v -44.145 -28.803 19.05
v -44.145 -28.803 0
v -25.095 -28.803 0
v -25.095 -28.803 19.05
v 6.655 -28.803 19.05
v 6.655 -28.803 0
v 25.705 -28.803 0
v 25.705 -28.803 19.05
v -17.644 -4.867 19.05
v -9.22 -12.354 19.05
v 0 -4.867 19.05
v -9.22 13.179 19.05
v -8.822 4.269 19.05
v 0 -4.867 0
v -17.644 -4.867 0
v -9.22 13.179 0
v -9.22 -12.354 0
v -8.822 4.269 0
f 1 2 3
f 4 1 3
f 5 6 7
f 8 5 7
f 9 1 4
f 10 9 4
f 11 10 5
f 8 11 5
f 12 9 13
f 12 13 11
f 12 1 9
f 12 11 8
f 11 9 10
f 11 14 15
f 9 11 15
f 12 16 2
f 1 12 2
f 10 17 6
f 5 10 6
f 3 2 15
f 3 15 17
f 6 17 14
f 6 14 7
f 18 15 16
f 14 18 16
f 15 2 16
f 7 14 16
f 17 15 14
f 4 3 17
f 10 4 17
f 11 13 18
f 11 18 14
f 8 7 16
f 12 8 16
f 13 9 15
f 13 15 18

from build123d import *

# Parameters (mm, degrees)
F1_DEPTH = 19.05


with BuildPart() as f1:
    # F0 (on Top) → F1 (new body)
    with BuildSketch(Plane.XY):
        Polygon((-9.220245, 13.178808), (-44.145245, -28.803289), (-25.095245, -28.803289), (-9.220245, -12.35446), (6.654755, -28.803289), (25.704755, -28.803289), align=None)
        Polygon((-17.64437, -4.866622), (-8.822185, 4.268971), (0, -4.866622), align=None, mode=Mode.SUBTRACT)
    extrude(amount=F1_DEPTH)


solid = f1.part
